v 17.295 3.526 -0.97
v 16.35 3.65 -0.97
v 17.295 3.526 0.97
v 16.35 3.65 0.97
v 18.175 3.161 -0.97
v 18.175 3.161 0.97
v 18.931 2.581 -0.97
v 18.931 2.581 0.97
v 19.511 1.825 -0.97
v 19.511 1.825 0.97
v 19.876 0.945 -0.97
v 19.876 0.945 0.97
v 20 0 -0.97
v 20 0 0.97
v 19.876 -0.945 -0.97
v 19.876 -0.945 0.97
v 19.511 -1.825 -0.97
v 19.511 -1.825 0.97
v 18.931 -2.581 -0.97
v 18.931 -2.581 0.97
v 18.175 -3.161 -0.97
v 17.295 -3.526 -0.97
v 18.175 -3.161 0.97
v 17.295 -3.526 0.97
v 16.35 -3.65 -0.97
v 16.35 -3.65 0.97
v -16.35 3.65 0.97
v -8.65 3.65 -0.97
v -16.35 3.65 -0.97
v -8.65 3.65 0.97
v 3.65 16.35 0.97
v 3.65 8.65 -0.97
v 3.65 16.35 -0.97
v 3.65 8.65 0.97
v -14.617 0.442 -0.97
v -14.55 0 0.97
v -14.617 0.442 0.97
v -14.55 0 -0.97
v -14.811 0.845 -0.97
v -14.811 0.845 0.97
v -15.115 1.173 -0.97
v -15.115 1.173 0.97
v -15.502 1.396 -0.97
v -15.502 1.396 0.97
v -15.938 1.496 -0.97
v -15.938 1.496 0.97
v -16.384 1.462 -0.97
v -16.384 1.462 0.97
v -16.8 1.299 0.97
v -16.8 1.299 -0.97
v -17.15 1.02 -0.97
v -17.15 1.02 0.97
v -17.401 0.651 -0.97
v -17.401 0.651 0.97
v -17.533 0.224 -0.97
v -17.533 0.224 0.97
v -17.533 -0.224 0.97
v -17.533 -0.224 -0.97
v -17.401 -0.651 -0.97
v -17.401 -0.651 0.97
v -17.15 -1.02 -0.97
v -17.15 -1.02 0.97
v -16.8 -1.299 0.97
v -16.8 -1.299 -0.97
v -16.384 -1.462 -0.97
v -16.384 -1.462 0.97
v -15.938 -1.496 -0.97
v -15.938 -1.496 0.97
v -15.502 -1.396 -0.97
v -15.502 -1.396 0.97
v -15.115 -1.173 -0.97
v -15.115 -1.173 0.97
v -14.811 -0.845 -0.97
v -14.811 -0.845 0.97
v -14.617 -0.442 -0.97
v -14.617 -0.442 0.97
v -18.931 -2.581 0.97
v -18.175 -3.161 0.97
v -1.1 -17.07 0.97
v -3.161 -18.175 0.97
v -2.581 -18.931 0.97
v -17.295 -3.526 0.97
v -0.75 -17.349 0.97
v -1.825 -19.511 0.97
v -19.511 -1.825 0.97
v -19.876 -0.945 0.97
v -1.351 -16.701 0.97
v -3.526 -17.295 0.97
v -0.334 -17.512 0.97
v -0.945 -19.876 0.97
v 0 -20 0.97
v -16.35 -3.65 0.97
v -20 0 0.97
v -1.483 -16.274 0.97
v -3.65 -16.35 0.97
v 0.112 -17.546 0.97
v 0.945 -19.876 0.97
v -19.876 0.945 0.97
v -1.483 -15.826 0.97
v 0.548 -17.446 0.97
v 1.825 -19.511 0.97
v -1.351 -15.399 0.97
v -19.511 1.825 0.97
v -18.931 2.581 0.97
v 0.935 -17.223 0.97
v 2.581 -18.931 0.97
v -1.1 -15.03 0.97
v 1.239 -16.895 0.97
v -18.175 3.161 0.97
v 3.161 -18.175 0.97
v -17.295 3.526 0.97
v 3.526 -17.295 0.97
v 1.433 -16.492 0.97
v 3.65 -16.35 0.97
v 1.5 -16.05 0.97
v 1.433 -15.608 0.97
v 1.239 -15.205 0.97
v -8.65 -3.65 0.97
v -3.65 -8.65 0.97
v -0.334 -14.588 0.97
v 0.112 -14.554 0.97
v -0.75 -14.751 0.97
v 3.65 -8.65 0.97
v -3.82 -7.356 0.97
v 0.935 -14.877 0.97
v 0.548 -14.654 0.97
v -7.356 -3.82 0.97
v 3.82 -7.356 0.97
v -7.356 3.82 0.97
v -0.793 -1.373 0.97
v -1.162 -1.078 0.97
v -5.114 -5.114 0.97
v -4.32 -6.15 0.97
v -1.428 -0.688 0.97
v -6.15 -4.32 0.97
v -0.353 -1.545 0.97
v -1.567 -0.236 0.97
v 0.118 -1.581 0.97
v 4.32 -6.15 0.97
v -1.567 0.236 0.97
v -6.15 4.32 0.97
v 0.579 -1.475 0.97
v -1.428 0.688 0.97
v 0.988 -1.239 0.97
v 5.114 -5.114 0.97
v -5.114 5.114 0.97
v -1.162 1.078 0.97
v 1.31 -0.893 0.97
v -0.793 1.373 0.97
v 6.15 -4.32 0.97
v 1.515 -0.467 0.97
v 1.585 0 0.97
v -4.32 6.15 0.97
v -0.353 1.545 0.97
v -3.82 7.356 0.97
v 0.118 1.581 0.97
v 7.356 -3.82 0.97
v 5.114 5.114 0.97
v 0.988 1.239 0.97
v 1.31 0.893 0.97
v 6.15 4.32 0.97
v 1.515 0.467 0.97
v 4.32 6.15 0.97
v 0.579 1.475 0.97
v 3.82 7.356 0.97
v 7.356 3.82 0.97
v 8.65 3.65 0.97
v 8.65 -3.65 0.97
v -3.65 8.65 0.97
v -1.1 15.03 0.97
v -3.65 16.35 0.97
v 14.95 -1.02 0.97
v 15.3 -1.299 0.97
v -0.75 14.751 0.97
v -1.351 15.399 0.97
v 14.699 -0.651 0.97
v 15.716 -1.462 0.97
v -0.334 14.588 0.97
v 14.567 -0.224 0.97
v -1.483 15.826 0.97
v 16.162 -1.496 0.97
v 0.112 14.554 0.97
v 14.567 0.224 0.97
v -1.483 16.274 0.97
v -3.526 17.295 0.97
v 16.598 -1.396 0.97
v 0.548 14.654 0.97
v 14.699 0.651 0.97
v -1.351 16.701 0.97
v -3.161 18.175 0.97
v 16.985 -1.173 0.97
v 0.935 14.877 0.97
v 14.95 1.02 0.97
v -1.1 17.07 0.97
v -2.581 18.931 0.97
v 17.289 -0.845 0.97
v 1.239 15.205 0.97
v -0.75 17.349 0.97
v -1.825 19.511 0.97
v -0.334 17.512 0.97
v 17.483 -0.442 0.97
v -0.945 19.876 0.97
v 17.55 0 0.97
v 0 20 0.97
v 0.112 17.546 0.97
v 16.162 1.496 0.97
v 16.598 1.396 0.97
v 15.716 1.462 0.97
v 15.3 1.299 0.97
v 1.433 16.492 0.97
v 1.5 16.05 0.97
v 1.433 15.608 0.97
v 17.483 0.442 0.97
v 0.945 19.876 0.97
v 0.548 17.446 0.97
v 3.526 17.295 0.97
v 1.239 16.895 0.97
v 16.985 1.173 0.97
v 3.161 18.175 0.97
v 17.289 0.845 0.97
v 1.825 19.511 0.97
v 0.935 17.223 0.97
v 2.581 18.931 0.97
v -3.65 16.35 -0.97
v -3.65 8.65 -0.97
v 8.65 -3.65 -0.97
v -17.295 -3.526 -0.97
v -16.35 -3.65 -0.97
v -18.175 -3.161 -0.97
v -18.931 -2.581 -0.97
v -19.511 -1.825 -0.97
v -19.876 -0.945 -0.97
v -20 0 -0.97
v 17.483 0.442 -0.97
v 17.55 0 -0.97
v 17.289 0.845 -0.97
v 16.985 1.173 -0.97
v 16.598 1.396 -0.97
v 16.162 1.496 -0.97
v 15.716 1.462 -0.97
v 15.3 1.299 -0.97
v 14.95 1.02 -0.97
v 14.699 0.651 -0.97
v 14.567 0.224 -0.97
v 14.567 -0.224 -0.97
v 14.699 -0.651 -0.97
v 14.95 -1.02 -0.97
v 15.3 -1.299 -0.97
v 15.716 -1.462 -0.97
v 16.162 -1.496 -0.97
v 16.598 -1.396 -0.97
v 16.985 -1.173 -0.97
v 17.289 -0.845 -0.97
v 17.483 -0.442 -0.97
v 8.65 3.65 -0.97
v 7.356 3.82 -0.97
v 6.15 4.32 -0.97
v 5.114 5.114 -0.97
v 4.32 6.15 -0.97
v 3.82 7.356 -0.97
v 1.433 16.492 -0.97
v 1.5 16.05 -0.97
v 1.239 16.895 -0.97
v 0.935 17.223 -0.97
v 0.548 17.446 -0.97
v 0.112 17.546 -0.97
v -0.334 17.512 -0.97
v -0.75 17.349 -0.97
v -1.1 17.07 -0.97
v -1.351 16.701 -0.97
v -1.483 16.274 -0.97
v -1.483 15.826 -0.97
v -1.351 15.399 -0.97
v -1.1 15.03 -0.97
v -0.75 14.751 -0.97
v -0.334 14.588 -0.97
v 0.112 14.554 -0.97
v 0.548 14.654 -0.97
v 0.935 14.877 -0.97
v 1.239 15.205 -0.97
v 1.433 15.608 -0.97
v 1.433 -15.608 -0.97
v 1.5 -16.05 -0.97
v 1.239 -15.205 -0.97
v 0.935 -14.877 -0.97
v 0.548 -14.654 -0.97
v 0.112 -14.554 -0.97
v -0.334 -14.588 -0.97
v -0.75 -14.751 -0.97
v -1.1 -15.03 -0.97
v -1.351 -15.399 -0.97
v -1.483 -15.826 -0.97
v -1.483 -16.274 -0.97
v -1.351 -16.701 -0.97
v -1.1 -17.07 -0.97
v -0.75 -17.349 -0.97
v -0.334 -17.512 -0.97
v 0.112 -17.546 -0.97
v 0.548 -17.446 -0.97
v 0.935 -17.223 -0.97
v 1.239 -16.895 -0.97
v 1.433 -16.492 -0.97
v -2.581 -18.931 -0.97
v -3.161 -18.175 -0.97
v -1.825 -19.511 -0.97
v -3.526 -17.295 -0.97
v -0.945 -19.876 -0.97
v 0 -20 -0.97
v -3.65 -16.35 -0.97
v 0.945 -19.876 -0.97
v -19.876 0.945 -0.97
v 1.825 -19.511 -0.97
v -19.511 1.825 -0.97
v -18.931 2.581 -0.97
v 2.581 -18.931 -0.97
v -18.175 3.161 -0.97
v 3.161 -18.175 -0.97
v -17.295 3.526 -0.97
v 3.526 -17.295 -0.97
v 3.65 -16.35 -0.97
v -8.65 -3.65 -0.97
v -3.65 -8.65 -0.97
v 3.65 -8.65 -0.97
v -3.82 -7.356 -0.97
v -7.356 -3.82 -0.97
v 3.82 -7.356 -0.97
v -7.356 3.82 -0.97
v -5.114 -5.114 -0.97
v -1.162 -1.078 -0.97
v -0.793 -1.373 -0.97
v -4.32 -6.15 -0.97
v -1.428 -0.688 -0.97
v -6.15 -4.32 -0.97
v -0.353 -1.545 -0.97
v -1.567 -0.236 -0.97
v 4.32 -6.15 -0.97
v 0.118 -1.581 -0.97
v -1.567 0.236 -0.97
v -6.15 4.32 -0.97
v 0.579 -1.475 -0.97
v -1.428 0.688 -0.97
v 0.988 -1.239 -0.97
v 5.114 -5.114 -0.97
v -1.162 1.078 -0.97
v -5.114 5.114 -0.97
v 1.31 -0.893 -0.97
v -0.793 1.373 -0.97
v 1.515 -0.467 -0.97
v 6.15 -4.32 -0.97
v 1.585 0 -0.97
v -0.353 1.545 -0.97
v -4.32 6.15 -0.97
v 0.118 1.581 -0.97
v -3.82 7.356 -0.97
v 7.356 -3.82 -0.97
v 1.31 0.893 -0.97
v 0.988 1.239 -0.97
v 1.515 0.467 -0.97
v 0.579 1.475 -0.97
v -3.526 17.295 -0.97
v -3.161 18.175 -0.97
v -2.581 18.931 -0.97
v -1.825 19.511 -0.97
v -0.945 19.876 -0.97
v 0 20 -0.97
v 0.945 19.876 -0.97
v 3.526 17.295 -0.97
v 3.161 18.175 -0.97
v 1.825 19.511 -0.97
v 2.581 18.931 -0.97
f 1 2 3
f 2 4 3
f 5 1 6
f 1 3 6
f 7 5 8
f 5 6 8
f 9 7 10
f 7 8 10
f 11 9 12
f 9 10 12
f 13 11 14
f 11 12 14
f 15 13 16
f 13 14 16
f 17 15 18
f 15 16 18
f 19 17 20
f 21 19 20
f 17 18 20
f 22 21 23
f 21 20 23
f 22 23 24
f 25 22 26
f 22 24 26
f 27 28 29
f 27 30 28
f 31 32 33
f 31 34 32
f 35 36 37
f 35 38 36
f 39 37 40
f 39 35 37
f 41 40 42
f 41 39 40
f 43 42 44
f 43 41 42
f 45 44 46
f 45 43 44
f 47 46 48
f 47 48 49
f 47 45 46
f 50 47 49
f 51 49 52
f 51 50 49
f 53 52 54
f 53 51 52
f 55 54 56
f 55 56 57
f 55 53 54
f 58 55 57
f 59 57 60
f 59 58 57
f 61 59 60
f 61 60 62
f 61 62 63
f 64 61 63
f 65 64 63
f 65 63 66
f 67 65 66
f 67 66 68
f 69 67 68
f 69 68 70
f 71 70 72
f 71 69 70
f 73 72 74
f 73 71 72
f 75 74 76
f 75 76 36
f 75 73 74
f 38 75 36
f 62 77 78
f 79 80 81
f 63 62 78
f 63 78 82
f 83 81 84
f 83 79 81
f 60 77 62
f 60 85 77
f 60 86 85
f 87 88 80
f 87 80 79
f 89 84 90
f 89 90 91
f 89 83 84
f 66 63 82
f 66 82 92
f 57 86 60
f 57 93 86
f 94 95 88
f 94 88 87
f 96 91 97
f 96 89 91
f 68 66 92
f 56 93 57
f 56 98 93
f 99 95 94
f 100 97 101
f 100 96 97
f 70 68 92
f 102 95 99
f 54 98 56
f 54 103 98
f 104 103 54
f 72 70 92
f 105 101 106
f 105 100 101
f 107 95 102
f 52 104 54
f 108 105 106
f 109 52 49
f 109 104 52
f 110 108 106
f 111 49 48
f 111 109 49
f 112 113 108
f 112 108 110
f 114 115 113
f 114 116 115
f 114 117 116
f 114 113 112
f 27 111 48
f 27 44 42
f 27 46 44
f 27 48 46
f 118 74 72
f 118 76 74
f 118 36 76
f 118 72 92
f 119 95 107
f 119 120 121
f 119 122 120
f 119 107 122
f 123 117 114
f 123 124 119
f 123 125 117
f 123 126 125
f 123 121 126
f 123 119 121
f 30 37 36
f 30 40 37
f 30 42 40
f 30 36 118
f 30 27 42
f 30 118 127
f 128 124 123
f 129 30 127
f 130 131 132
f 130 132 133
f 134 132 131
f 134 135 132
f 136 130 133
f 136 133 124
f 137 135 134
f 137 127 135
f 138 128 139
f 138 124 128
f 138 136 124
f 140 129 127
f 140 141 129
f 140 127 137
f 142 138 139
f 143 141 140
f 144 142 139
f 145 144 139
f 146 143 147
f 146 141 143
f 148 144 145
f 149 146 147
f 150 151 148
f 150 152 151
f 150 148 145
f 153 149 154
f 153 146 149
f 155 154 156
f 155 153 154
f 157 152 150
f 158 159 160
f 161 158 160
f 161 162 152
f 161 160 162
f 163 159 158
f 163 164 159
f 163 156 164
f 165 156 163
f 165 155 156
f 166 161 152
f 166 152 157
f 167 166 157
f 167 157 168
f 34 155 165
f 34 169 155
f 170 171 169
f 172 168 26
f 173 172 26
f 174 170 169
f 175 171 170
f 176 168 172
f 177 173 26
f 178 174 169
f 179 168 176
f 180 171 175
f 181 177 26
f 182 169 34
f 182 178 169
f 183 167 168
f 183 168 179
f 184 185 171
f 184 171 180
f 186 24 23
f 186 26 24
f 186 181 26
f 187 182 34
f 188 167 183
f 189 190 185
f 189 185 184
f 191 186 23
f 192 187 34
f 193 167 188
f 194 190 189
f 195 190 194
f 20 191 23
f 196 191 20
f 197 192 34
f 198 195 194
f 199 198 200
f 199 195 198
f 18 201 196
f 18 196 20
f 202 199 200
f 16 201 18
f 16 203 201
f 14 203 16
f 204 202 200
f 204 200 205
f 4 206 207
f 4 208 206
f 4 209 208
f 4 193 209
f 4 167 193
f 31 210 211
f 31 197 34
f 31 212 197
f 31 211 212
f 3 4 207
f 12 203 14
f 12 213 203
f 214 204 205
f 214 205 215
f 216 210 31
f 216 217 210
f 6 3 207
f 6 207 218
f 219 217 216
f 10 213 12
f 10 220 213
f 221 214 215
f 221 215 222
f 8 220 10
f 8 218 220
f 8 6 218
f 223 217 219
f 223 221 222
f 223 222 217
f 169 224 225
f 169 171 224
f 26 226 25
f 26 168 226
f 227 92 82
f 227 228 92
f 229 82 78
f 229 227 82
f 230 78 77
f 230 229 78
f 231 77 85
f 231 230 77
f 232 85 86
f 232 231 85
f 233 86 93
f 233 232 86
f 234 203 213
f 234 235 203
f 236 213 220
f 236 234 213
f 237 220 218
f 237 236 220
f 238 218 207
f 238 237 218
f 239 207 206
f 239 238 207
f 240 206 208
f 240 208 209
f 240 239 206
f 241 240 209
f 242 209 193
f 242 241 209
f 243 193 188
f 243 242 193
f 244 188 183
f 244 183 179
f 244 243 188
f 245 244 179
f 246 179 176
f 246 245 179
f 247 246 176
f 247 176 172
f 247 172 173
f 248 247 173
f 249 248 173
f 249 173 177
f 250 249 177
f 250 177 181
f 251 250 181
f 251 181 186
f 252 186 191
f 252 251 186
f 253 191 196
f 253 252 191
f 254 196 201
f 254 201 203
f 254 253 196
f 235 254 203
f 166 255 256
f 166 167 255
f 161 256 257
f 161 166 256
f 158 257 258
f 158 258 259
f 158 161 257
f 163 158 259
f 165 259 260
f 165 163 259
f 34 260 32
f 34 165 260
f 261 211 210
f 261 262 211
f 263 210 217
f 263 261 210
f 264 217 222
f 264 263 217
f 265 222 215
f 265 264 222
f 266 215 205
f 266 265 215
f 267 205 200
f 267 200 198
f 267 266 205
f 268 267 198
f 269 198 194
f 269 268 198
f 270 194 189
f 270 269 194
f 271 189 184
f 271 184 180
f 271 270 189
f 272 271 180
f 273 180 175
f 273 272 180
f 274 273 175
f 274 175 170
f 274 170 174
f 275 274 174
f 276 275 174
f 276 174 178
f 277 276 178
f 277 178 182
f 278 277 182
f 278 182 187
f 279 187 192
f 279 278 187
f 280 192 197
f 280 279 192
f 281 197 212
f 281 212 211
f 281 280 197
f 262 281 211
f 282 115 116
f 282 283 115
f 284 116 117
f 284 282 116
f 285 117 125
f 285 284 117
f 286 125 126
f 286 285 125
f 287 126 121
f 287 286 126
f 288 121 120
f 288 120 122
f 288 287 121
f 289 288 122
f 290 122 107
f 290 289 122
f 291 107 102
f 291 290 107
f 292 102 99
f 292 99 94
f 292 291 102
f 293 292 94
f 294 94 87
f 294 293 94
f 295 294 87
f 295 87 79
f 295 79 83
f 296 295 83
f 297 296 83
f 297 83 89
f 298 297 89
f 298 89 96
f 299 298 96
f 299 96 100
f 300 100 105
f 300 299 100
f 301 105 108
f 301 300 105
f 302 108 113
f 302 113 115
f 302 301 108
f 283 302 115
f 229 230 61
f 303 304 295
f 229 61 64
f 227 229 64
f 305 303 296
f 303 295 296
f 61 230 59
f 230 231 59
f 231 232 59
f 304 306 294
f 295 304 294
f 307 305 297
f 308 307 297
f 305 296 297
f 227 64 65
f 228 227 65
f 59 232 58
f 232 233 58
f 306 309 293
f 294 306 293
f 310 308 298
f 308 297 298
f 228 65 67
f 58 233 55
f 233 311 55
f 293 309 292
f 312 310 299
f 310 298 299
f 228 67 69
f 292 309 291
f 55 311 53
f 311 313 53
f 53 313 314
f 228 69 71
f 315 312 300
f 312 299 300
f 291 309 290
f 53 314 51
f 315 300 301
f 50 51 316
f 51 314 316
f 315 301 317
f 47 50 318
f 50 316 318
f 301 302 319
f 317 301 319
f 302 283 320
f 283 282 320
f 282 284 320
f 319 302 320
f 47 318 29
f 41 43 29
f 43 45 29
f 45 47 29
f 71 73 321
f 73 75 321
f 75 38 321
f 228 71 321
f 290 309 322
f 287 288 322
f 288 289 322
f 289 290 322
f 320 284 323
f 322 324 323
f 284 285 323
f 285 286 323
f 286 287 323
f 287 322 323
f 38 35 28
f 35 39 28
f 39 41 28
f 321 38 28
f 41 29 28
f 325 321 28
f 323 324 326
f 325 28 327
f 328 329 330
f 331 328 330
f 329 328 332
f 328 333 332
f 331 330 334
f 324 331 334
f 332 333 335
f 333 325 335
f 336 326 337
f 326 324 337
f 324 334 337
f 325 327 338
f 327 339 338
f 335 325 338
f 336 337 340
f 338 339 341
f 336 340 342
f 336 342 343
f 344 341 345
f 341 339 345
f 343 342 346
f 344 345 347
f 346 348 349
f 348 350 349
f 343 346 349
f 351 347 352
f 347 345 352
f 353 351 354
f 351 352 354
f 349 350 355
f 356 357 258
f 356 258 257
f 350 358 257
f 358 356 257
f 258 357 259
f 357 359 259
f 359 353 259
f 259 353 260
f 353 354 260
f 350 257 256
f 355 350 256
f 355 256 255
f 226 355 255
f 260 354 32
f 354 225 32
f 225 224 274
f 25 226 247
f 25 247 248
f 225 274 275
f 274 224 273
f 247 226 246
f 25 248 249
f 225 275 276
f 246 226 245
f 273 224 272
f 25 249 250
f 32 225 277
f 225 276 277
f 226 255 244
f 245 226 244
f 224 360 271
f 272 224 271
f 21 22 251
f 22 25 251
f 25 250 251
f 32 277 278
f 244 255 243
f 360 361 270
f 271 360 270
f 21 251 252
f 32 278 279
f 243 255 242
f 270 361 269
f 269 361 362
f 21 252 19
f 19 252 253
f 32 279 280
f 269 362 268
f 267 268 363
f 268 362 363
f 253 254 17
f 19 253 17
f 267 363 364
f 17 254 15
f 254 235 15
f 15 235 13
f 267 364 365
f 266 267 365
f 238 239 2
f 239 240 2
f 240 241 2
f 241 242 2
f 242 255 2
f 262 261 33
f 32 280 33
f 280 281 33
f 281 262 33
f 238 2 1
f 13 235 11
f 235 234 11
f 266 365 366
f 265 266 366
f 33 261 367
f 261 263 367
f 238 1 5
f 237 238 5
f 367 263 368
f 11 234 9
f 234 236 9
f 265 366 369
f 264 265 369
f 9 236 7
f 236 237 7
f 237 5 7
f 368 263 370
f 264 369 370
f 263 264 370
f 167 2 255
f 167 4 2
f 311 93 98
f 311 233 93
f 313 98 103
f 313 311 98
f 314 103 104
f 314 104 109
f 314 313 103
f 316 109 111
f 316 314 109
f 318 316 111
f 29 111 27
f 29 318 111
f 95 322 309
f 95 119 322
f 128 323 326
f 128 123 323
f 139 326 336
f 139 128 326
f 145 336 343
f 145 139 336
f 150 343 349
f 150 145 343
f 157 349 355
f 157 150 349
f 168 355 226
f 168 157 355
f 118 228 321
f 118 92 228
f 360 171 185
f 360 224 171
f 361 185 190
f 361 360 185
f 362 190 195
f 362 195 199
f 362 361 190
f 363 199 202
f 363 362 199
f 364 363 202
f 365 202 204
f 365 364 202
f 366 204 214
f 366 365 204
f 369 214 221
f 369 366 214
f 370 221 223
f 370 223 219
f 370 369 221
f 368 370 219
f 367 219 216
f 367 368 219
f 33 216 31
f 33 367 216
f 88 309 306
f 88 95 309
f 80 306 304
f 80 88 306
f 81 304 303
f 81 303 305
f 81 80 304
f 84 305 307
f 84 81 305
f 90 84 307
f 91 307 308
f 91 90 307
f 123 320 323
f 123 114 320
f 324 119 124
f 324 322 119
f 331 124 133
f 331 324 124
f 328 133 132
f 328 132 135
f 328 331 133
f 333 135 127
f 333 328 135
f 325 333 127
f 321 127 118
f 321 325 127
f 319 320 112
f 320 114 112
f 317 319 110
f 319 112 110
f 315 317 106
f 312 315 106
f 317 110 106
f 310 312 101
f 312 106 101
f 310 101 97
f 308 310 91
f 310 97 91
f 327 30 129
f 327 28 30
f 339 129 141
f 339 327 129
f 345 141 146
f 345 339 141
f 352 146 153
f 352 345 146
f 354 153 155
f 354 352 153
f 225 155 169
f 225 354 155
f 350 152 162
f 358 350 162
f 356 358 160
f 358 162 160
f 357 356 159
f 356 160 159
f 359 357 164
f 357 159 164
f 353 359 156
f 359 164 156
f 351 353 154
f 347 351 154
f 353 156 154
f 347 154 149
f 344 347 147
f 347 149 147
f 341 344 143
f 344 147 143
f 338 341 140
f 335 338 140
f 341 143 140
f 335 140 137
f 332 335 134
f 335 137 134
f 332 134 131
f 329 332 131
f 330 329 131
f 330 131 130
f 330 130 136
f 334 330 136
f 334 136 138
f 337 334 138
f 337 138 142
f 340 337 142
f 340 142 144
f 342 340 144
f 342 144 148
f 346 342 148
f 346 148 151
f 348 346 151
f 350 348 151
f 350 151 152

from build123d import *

# Parameters (mm, degrees)
SKETCH2_R           = 1.5
BOSS_EXTRUDE1_DEPTH = 0.97
FILLET1_R           = 3.65
FILLET2_R           = 5
SKETCH3_R           = 1.585
CUT_EXTRUDE1_DEPTH  = 29.350724858


with BuildPart() as part:
    # Sketch2 → Boss-Extrude1 (new, symmetric)
    with BuildSketch(Plane.XY):
        Polygon((-3.65, -3.65), (-3.65, -20), (3.65, -20), (3.65, -3.65), (20, -3.65), (20, 3.65), (3.65, 3.65), (3.65, 20), (-3.65, 20), (-3.65, 3.65), (-20, 3.65), (-20, -3.65), align=None)
        with Locations((-16.05, 0)):
            Circle(SKETCH2_R, mode=Mode.SUBTRACT)
        with Locations((0, -16.05)):
            Circle(SKETCH2_R, mode=Mode.SUBTRACT)
        with Locations((16.05, 0)):
            Circle(SKETCH2_R, mode=Mode.SUBTRACT)
        with Locations((0, 16.05)):
            Circle(SKETCH2_R, mode=Mode.SUBTRACT)
    extrude(amount=BOSS_EXTRUDE1_DEPTH, both=True)

    # Fillet1
    fillet1_edges = [part.edges().sort_by_distance(p)[0] for p in [
        (20, 3.65, 0),
        (20, -3.65, 0),
        (3.65, -20, 0),
        (-3.65, -20, 0),
        (-20, -3.65, 0),
        (-20, 3.65, 0),
        (3.65, 20, 0),
        (-3.65, 20, 0),
    ]]
    fillet(fillet1_edges, radius=FILLET1_R - 0.0001)  # a hair under: the kernel refuses the full size

    # Fillet2
    fillet2_edges = [part.edges().sort_by_distance(p)[0] for p in [
        (-3.65, -3.65, 0),
        (-3.65, 3.65, 0),
        (3.65, 3.65, 0),
        (3.65, -3.65, 0),
    ]]
    fillet(fillet2_edges, radius=FILLET2_R)

    # Sketch3 → Cut-Extrude1 (cut, through all)
    with BuildSketch(Plane.XY.offset(0.97)):
        Circle(SKETCH3_R)
    extrude(amount=-CUT_EXTRUDE1_DEPTH, mode=Mode.SUBTRACT)


solid = part.part
